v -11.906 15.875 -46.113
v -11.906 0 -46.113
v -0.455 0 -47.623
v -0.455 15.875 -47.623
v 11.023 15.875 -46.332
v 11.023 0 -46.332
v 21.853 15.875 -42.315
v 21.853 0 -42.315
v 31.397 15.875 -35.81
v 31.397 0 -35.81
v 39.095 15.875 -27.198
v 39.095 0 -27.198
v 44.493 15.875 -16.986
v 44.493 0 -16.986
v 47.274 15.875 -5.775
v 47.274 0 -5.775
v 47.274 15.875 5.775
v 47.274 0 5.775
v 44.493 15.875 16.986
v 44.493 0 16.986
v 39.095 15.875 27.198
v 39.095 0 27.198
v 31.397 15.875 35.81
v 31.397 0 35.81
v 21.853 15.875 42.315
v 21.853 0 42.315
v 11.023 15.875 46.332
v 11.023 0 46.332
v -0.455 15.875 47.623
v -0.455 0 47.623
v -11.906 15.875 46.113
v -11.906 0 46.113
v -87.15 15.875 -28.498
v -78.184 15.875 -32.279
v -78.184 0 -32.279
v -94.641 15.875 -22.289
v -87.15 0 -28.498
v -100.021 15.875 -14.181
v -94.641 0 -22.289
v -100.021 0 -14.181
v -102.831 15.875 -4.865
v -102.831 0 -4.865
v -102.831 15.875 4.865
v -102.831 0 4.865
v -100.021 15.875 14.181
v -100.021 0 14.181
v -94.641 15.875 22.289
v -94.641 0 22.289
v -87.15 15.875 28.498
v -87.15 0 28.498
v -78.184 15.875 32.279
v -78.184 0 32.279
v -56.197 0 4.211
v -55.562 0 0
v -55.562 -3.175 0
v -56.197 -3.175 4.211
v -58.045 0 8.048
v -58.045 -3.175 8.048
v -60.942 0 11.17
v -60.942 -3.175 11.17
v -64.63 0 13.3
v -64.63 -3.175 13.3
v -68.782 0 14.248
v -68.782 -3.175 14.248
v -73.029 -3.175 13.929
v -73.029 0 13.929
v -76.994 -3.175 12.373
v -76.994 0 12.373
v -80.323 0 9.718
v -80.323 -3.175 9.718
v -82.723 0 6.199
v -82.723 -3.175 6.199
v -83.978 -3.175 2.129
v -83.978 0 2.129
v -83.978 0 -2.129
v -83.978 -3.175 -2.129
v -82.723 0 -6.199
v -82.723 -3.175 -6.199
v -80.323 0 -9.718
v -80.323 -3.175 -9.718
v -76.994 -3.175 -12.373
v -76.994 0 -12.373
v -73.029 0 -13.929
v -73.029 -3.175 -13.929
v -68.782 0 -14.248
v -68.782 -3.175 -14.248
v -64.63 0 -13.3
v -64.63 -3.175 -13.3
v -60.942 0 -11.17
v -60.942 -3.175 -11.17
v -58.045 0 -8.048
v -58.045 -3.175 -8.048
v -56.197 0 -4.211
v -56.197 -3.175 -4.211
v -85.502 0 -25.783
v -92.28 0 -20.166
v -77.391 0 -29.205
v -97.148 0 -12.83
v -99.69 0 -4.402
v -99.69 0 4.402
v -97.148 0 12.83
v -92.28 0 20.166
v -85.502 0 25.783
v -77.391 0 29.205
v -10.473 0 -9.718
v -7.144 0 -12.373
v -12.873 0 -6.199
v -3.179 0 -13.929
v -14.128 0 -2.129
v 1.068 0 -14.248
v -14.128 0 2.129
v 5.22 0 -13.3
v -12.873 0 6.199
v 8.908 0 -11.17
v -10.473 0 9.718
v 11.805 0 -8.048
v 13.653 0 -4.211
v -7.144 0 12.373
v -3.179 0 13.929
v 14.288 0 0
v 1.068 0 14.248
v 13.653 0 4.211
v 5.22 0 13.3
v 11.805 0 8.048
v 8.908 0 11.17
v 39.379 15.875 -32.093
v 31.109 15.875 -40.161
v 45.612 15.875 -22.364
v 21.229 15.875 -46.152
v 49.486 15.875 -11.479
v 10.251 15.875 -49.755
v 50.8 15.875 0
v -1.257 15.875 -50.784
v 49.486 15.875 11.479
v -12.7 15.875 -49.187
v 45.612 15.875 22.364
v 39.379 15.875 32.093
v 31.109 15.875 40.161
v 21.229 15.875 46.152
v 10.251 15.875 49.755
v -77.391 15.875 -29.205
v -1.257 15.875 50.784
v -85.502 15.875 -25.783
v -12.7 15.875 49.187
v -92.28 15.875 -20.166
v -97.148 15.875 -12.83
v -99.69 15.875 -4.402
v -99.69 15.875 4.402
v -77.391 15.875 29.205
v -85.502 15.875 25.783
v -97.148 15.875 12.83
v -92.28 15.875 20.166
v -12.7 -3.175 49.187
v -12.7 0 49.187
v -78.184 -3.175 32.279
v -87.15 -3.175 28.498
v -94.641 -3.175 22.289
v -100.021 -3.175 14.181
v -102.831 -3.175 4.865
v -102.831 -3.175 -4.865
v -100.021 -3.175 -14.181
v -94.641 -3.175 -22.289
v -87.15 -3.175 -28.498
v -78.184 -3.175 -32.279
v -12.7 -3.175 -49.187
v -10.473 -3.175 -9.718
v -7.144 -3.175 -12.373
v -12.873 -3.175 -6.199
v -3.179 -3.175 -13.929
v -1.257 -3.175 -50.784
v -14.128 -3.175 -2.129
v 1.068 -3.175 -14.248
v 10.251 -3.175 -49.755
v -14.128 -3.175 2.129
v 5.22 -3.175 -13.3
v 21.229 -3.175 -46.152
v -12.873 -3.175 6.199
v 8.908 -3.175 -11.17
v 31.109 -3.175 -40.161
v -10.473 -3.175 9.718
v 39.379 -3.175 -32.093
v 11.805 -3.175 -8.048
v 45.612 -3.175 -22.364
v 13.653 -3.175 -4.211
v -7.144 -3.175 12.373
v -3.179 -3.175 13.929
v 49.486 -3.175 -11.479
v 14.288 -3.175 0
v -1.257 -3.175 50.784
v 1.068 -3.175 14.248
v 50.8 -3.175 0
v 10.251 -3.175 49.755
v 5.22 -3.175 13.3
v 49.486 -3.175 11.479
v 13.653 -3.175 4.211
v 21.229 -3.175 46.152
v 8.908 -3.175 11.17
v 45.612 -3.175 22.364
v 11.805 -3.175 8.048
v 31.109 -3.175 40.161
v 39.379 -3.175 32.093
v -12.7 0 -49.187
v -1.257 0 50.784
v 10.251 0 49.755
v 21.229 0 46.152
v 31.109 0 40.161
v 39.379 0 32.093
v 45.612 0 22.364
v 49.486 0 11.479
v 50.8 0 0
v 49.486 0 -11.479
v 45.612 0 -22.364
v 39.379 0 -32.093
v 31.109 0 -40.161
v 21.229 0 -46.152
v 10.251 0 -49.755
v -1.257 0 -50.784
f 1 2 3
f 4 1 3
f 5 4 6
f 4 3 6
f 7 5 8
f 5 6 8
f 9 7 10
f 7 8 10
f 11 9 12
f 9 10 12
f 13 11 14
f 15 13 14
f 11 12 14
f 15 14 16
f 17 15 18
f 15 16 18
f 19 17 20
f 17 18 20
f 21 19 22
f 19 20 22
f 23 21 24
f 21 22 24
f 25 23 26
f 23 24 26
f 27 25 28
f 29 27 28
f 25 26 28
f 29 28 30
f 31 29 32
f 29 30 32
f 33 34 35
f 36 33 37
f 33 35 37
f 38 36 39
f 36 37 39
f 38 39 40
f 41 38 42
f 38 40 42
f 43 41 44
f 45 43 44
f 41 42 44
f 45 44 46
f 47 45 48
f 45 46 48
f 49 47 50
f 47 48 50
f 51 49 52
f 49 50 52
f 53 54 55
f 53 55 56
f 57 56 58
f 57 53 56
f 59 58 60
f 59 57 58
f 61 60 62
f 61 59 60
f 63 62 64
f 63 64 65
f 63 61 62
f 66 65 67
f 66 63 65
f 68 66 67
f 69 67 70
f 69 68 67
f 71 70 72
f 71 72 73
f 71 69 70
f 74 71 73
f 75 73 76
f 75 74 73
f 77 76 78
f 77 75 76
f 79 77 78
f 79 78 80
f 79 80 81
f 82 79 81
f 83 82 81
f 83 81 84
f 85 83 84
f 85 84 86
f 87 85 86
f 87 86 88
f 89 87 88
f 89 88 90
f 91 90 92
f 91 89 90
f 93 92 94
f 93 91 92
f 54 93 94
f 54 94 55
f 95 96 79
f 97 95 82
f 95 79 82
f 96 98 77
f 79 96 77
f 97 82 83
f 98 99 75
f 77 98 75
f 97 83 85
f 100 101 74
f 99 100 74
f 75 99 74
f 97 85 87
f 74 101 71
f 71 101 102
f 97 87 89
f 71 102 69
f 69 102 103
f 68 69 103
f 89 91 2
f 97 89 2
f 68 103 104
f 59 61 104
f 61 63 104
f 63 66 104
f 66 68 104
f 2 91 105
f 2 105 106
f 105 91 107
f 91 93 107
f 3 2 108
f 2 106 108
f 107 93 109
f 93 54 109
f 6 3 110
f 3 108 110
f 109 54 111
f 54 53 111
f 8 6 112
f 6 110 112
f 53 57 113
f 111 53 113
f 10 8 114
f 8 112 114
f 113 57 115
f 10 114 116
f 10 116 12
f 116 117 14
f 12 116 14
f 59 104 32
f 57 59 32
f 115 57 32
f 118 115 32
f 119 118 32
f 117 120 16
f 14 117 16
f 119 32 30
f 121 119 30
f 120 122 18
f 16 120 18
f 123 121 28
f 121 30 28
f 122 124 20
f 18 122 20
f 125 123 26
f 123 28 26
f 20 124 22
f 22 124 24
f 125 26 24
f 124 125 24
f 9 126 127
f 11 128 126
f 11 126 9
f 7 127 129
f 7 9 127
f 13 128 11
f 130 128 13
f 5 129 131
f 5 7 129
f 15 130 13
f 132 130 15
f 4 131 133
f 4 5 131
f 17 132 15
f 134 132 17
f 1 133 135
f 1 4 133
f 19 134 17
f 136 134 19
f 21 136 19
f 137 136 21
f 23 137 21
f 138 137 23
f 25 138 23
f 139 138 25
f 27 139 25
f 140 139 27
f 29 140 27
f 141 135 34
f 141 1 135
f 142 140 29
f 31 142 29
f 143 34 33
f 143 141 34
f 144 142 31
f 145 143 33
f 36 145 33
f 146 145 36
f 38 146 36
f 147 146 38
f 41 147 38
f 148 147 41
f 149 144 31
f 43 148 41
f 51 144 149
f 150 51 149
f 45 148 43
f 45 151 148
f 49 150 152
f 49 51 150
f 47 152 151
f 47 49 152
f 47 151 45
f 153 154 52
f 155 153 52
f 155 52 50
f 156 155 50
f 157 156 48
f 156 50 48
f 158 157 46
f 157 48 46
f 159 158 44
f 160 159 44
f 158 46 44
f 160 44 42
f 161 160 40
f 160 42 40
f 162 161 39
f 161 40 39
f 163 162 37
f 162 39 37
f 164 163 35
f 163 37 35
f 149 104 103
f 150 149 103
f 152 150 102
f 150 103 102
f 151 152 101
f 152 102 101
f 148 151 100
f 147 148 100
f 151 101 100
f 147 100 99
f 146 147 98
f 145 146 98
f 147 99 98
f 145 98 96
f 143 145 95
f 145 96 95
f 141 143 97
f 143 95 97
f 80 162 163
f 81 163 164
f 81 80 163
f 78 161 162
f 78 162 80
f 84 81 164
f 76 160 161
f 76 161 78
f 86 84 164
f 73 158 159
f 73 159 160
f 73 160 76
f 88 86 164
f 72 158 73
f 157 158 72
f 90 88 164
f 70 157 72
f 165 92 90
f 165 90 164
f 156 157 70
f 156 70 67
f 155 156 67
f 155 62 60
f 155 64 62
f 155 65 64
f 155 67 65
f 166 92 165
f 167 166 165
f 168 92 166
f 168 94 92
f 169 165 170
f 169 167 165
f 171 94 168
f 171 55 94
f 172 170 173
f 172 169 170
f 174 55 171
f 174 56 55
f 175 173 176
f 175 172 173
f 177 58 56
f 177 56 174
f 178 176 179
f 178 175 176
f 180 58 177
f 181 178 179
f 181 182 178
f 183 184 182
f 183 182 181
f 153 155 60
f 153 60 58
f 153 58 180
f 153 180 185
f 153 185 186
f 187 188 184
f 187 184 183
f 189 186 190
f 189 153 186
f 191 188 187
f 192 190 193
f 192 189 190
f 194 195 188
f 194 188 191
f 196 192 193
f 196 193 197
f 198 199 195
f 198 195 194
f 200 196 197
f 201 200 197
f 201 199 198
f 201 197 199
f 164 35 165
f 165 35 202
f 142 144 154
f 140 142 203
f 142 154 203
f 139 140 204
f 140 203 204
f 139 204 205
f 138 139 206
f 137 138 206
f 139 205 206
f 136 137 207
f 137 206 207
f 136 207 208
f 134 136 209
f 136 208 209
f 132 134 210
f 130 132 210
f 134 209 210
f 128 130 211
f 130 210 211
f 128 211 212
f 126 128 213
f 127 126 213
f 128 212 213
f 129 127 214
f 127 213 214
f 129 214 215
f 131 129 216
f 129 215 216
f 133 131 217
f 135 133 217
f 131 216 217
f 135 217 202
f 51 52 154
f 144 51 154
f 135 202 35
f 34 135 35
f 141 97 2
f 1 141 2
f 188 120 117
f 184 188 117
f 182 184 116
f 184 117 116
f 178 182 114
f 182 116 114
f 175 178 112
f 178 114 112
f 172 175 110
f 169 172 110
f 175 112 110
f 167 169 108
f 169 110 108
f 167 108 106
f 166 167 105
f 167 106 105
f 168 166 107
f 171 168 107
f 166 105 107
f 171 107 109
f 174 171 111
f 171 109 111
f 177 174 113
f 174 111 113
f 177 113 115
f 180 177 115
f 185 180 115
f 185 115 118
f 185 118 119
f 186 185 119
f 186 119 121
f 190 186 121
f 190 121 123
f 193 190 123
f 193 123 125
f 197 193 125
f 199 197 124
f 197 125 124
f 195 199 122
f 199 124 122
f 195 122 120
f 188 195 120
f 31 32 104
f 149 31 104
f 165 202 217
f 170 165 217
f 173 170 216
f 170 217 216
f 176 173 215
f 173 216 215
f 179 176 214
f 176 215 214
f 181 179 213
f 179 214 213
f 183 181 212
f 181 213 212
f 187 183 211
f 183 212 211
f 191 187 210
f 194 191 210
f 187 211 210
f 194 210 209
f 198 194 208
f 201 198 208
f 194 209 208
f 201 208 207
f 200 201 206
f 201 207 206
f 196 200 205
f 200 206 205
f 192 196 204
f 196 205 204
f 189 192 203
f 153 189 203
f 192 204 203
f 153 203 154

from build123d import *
from build123d import SkipClean  # not in build123d's __all__

# Parameters (mm, degrees)
F0_R     = 14.2875
F1_DEPTH = 3.175
F3_DEPTH = 15.875


with BuildPart() as f1:
    # F0 (on Front) → F1 (new body)
    with BuildSketch(Plane.XZ):
        with BuildLine():
            Line((-78.184375, -32.278895576), (-12.7, -49.1868884968))
            ThreePointArc((-12.7, -49.1868884968), (50.8, 0), (-12.7, 49.1868884968))
            Line((-12.7, 49.1868884968), (-78.184375, 32.278895576))
            ThreePointArc((-78.184375, 32.278895576), (-103.1875, 0), (-78.184375, -32.278895576))
        make_face()
        with Locations((-69.85, 0)):
            Circle(F0_R, mode=Mode.SUBTRACT)
        with BuildLine():
            ThreePointArc((-14.2875, 0), (0, 14.2875), (14.2875, 0))
            ThreePointArc((14.2875, 0), (0, -14.2875), (-14.2875, 0))
        make_face(mode=Mode.SUBTRACT)
    extrude(amount=F1_DEPTH)

    # F2 (on face) → F3 (join)
    with BuildSketch(Plane(origin=(0, 0, 0), x_dir=(-1, 0, 0), z_dir=(0, 1, 0))):
        with BuildLine():
            ThreePointArc((78.184375, -32.278895576), (103.1875, 0), (78.184375, 32.278895576))
            Line((78.184375, 32.278895576), (12.7, 49.1868884968))
            ThreePointArc((12.7, 49.1868884968), (-50.8, 0), (12.7, -49.1868884968))
            Line((12.7, -49.1868884968), (78.184375, -32.278895576))
        make_face()
        with BuildLine():
            Line((11.90625, 46.1127079658), (77.390625, 29.204715045))
            ThreePointArc((77.390625, 29.204715045), (100.0125, 0), (77.390625, -29.204715045))
            Line((77.390625, -29.204715045), (11.90625, -46.1127079658))
            ThreePointArc((11.90625, -46.1127079658), (-47.625, 0), (11.90625, 46.1127079658))
        make_face(mode=Mode.SUBTRACT)
    with SkipClean():  # cleaning this boolean's faces spoils the solid; the shape is the same uncleaned
        extrude(amount=F3_DEPTH)


solid = f1.part
